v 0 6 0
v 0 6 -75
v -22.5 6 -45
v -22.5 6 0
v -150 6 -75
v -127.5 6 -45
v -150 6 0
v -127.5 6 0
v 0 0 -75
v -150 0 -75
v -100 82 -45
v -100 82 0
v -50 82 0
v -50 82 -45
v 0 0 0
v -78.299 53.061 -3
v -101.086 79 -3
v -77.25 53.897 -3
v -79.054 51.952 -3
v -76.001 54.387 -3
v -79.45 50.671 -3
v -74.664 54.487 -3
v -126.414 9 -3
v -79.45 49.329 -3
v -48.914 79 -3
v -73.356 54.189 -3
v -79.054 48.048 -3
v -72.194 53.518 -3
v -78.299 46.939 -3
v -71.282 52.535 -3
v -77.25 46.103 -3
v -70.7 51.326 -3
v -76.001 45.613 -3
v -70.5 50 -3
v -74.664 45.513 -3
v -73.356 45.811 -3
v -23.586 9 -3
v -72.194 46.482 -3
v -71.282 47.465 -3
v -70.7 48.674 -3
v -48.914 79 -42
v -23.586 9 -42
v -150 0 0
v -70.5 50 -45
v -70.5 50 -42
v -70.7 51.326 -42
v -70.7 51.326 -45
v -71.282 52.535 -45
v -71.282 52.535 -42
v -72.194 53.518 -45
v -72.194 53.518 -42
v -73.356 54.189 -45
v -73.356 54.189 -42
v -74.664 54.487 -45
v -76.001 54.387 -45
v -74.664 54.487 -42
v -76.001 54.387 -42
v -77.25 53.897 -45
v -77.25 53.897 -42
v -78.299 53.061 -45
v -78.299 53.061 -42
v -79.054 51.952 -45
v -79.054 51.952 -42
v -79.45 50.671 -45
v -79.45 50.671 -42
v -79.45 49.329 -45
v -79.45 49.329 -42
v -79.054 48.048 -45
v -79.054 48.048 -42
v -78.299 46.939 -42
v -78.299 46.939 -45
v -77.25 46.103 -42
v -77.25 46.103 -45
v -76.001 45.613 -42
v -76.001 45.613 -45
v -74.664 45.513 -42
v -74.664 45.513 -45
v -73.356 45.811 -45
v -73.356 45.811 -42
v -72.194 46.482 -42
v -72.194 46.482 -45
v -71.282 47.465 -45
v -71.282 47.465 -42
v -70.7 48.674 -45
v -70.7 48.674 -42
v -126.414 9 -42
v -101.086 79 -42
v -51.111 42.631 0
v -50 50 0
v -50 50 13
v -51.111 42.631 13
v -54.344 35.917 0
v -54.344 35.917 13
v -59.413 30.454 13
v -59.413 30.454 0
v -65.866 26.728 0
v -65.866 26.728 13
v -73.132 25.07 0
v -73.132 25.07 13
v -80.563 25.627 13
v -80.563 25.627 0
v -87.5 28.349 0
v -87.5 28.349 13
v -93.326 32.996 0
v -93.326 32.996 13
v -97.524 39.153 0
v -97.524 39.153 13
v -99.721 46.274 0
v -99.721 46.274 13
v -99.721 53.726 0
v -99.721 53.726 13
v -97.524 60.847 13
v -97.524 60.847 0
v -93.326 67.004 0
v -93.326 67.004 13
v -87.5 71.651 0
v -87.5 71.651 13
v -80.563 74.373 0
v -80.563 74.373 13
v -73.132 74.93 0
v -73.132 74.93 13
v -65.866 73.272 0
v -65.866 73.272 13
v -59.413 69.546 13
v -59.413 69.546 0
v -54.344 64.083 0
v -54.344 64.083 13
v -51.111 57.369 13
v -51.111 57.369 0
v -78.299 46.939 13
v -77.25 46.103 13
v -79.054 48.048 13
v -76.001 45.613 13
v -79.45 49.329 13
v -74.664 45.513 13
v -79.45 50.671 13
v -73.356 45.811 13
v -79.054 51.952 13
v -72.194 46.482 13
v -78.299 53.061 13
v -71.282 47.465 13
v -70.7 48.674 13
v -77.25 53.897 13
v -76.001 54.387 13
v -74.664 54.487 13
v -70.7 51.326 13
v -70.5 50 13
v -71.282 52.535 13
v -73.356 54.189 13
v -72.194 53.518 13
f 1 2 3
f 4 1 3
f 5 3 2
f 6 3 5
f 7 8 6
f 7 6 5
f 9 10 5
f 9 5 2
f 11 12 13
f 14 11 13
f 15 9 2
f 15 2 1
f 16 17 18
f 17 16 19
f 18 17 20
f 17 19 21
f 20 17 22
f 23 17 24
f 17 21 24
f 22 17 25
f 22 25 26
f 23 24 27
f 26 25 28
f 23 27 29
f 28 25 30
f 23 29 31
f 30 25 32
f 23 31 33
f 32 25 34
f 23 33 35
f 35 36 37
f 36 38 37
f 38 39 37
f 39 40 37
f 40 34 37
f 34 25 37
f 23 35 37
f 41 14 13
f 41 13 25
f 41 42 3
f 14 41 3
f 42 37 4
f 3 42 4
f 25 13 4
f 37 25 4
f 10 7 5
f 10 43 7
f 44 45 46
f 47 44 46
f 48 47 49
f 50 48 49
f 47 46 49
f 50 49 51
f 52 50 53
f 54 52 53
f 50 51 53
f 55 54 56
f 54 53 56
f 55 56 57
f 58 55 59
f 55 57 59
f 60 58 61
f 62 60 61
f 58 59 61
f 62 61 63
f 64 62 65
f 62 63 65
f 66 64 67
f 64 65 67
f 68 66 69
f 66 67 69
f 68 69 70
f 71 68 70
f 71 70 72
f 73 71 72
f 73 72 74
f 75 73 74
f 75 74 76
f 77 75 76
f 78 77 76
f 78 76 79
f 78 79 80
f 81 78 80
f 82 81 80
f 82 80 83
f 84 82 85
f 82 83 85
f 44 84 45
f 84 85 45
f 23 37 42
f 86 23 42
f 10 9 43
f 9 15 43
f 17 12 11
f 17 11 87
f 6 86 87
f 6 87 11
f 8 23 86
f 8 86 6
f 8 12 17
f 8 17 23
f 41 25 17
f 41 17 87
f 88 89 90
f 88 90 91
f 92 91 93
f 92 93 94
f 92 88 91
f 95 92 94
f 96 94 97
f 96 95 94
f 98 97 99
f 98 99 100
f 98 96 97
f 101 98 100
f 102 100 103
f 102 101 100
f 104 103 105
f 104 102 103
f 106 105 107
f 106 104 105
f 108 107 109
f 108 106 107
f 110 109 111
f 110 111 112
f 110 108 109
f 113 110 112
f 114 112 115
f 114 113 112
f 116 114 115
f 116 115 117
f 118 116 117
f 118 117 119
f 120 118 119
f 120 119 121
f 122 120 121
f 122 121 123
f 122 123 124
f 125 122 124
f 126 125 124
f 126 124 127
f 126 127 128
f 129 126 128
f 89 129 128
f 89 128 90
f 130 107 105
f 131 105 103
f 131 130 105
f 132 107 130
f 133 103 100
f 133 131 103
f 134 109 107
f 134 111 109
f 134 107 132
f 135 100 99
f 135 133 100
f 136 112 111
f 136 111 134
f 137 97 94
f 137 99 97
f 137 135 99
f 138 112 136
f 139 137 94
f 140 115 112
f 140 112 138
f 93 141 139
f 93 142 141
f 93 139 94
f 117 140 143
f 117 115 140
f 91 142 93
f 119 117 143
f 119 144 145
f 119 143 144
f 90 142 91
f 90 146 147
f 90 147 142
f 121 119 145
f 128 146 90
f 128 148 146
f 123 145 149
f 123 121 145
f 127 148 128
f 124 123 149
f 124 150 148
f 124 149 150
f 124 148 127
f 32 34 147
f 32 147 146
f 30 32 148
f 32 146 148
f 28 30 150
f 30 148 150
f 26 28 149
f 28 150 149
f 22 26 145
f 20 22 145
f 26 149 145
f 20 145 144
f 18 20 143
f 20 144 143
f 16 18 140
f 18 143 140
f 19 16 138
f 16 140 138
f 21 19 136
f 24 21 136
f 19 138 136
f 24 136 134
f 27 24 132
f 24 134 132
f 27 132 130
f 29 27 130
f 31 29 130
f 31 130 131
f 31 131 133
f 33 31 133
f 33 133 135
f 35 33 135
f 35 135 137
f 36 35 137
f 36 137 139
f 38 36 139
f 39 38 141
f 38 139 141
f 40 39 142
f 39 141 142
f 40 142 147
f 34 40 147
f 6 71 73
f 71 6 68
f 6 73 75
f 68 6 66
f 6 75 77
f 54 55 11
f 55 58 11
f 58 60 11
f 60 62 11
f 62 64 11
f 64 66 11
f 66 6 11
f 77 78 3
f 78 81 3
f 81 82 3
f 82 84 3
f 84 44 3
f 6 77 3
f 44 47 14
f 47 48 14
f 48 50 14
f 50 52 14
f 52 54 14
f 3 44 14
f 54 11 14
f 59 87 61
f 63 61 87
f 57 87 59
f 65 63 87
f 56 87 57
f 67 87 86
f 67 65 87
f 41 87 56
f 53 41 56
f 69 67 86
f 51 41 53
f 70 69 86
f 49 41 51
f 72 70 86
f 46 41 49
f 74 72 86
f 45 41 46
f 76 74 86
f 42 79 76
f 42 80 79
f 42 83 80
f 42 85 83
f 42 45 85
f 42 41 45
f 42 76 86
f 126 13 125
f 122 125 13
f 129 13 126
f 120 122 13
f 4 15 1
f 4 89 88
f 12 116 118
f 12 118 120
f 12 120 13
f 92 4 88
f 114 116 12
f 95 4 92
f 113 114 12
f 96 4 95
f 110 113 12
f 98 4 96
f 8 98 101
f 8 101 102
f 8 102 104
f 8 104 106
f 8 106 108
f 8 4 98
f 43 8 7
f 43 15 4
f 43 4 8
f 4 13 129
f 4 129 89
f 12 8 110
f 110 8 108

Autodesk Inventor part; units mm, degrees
ref_plane "YZ Plane" through (0, 0, 0) normal (1, 0, 0) x (0, 1, 0)
ref_plane "XZ Plane" through (0, 0, 0) normal (0, 1, 0) x (-1, 0, 0)
ref_plane "XY Plane" through (0, 0, 0) normal (0, 0, 1) x (1, 0, 0)
sketch "Sketch1" plane through (0, 0, 0) normal (0, 1, 0) x (-1, 0, 0)
  line L0 (0, 0) -> (150, 0)
  line L1 (150, 0) -> (150, -75)
  line L2 (150, -75) -> (0, -75)
  line L3 (0, -75) -> (0, 0)
  dimension "d0" = 150
  dimension "d1" = 75
extrude "Extrusion1" add sketch "Sketch1" along normal blind 6
sketch "Sketch6" plane through (-150, 0, 0) normal (0, 0, 1) x (1, 0, 0)
  line L0 (0, 6) -> (150, 6) projected
  line L1 (50, 82) -> (22.5, 6)
  line L2 (100, 82) -> (127.5, 6)
  line L3 (50, 82) -> (100, 82)
  line L4 (22.5, 6) -> (127.5, 6)
  line L5 (22.5, 6) -> (127.5, 6)
  line L6 (100, 82) -> (50, 82)
  line L7 (50, 82) -> (22.5, 6)
  line L8 (100, 82) -> (127.5, 6)
extrude "Extrusion2" add sketch "Sketch6" against normal blind 45
sketch "Sketch7" plane through (-150, 0, 0) normal (0, 0, 1) x (1, 0, 0)
  line L0 (150, 0) -> (0, 0) projected
  line L1 (75, 0) -> (75, 50)
  circle A0 centre (75, 50) radius 25
  dimension "d14" = 50
  dimension "d15" = 50
extrude "Extrusion3" add sketch "Sketch7" along normal blind 13
sketch "Sketch9" plane through (0, 0, 0) normal (1, 0, 0) x (0, 0, -1)
  line L0 (0, 6) -> (75, 6) projected
  line L1 (45, 82) -> (0, 82)
  line L2 (0, 82) -> (45, 82) projected
  line L3 (0, 6) -> (0, 9)
  line L4 (0, 6) -> (0, 82) projected
  line L5 (0, 9) -> (45, 9)
  line L6 (45, 6) -> (45, 82) projected
  line L7 (0, 82) -> (3, 82)
  line L8 (3, 82) -> (3, 9)
  line L9 (0, 82) -> (0, 79)
  line L10 (0, 79) -> (45, 79)
  line L11 (45, 79) -> (42, 79)
  line L12 (42, 79) -> (42, 6)
  line L13 (3, 9) -> (3, 79)
  line L14 (3, 79) -> (42, 79)
  line L15 (42, 79) -> (42, 9)
  line L16 (42, 9) -> (3, 9)
  dimension "d18" = 3
  dimension "d19" = 3
  dimension "d20" = 3
  dimension "d21" = 3
extrude "Extrusion4" cut sketch "Sketch9" against normal blind 150 contours L5 L8 L10 L12
sketch "Sketch10" plane through (-75, 50, 13) normal (0, 0, 1) x (1, 0, 0)
  circle A0 centre (0, 0) radius 25 projected
  circle A1 centre (0, 0) radius 4.5
  point P0 (75, -50)
  dimension "d24" = 9
extrude "Extrusion5" cut sketch "Sketch10" against normal blind 150 contours A1
properties part number "Casing"
